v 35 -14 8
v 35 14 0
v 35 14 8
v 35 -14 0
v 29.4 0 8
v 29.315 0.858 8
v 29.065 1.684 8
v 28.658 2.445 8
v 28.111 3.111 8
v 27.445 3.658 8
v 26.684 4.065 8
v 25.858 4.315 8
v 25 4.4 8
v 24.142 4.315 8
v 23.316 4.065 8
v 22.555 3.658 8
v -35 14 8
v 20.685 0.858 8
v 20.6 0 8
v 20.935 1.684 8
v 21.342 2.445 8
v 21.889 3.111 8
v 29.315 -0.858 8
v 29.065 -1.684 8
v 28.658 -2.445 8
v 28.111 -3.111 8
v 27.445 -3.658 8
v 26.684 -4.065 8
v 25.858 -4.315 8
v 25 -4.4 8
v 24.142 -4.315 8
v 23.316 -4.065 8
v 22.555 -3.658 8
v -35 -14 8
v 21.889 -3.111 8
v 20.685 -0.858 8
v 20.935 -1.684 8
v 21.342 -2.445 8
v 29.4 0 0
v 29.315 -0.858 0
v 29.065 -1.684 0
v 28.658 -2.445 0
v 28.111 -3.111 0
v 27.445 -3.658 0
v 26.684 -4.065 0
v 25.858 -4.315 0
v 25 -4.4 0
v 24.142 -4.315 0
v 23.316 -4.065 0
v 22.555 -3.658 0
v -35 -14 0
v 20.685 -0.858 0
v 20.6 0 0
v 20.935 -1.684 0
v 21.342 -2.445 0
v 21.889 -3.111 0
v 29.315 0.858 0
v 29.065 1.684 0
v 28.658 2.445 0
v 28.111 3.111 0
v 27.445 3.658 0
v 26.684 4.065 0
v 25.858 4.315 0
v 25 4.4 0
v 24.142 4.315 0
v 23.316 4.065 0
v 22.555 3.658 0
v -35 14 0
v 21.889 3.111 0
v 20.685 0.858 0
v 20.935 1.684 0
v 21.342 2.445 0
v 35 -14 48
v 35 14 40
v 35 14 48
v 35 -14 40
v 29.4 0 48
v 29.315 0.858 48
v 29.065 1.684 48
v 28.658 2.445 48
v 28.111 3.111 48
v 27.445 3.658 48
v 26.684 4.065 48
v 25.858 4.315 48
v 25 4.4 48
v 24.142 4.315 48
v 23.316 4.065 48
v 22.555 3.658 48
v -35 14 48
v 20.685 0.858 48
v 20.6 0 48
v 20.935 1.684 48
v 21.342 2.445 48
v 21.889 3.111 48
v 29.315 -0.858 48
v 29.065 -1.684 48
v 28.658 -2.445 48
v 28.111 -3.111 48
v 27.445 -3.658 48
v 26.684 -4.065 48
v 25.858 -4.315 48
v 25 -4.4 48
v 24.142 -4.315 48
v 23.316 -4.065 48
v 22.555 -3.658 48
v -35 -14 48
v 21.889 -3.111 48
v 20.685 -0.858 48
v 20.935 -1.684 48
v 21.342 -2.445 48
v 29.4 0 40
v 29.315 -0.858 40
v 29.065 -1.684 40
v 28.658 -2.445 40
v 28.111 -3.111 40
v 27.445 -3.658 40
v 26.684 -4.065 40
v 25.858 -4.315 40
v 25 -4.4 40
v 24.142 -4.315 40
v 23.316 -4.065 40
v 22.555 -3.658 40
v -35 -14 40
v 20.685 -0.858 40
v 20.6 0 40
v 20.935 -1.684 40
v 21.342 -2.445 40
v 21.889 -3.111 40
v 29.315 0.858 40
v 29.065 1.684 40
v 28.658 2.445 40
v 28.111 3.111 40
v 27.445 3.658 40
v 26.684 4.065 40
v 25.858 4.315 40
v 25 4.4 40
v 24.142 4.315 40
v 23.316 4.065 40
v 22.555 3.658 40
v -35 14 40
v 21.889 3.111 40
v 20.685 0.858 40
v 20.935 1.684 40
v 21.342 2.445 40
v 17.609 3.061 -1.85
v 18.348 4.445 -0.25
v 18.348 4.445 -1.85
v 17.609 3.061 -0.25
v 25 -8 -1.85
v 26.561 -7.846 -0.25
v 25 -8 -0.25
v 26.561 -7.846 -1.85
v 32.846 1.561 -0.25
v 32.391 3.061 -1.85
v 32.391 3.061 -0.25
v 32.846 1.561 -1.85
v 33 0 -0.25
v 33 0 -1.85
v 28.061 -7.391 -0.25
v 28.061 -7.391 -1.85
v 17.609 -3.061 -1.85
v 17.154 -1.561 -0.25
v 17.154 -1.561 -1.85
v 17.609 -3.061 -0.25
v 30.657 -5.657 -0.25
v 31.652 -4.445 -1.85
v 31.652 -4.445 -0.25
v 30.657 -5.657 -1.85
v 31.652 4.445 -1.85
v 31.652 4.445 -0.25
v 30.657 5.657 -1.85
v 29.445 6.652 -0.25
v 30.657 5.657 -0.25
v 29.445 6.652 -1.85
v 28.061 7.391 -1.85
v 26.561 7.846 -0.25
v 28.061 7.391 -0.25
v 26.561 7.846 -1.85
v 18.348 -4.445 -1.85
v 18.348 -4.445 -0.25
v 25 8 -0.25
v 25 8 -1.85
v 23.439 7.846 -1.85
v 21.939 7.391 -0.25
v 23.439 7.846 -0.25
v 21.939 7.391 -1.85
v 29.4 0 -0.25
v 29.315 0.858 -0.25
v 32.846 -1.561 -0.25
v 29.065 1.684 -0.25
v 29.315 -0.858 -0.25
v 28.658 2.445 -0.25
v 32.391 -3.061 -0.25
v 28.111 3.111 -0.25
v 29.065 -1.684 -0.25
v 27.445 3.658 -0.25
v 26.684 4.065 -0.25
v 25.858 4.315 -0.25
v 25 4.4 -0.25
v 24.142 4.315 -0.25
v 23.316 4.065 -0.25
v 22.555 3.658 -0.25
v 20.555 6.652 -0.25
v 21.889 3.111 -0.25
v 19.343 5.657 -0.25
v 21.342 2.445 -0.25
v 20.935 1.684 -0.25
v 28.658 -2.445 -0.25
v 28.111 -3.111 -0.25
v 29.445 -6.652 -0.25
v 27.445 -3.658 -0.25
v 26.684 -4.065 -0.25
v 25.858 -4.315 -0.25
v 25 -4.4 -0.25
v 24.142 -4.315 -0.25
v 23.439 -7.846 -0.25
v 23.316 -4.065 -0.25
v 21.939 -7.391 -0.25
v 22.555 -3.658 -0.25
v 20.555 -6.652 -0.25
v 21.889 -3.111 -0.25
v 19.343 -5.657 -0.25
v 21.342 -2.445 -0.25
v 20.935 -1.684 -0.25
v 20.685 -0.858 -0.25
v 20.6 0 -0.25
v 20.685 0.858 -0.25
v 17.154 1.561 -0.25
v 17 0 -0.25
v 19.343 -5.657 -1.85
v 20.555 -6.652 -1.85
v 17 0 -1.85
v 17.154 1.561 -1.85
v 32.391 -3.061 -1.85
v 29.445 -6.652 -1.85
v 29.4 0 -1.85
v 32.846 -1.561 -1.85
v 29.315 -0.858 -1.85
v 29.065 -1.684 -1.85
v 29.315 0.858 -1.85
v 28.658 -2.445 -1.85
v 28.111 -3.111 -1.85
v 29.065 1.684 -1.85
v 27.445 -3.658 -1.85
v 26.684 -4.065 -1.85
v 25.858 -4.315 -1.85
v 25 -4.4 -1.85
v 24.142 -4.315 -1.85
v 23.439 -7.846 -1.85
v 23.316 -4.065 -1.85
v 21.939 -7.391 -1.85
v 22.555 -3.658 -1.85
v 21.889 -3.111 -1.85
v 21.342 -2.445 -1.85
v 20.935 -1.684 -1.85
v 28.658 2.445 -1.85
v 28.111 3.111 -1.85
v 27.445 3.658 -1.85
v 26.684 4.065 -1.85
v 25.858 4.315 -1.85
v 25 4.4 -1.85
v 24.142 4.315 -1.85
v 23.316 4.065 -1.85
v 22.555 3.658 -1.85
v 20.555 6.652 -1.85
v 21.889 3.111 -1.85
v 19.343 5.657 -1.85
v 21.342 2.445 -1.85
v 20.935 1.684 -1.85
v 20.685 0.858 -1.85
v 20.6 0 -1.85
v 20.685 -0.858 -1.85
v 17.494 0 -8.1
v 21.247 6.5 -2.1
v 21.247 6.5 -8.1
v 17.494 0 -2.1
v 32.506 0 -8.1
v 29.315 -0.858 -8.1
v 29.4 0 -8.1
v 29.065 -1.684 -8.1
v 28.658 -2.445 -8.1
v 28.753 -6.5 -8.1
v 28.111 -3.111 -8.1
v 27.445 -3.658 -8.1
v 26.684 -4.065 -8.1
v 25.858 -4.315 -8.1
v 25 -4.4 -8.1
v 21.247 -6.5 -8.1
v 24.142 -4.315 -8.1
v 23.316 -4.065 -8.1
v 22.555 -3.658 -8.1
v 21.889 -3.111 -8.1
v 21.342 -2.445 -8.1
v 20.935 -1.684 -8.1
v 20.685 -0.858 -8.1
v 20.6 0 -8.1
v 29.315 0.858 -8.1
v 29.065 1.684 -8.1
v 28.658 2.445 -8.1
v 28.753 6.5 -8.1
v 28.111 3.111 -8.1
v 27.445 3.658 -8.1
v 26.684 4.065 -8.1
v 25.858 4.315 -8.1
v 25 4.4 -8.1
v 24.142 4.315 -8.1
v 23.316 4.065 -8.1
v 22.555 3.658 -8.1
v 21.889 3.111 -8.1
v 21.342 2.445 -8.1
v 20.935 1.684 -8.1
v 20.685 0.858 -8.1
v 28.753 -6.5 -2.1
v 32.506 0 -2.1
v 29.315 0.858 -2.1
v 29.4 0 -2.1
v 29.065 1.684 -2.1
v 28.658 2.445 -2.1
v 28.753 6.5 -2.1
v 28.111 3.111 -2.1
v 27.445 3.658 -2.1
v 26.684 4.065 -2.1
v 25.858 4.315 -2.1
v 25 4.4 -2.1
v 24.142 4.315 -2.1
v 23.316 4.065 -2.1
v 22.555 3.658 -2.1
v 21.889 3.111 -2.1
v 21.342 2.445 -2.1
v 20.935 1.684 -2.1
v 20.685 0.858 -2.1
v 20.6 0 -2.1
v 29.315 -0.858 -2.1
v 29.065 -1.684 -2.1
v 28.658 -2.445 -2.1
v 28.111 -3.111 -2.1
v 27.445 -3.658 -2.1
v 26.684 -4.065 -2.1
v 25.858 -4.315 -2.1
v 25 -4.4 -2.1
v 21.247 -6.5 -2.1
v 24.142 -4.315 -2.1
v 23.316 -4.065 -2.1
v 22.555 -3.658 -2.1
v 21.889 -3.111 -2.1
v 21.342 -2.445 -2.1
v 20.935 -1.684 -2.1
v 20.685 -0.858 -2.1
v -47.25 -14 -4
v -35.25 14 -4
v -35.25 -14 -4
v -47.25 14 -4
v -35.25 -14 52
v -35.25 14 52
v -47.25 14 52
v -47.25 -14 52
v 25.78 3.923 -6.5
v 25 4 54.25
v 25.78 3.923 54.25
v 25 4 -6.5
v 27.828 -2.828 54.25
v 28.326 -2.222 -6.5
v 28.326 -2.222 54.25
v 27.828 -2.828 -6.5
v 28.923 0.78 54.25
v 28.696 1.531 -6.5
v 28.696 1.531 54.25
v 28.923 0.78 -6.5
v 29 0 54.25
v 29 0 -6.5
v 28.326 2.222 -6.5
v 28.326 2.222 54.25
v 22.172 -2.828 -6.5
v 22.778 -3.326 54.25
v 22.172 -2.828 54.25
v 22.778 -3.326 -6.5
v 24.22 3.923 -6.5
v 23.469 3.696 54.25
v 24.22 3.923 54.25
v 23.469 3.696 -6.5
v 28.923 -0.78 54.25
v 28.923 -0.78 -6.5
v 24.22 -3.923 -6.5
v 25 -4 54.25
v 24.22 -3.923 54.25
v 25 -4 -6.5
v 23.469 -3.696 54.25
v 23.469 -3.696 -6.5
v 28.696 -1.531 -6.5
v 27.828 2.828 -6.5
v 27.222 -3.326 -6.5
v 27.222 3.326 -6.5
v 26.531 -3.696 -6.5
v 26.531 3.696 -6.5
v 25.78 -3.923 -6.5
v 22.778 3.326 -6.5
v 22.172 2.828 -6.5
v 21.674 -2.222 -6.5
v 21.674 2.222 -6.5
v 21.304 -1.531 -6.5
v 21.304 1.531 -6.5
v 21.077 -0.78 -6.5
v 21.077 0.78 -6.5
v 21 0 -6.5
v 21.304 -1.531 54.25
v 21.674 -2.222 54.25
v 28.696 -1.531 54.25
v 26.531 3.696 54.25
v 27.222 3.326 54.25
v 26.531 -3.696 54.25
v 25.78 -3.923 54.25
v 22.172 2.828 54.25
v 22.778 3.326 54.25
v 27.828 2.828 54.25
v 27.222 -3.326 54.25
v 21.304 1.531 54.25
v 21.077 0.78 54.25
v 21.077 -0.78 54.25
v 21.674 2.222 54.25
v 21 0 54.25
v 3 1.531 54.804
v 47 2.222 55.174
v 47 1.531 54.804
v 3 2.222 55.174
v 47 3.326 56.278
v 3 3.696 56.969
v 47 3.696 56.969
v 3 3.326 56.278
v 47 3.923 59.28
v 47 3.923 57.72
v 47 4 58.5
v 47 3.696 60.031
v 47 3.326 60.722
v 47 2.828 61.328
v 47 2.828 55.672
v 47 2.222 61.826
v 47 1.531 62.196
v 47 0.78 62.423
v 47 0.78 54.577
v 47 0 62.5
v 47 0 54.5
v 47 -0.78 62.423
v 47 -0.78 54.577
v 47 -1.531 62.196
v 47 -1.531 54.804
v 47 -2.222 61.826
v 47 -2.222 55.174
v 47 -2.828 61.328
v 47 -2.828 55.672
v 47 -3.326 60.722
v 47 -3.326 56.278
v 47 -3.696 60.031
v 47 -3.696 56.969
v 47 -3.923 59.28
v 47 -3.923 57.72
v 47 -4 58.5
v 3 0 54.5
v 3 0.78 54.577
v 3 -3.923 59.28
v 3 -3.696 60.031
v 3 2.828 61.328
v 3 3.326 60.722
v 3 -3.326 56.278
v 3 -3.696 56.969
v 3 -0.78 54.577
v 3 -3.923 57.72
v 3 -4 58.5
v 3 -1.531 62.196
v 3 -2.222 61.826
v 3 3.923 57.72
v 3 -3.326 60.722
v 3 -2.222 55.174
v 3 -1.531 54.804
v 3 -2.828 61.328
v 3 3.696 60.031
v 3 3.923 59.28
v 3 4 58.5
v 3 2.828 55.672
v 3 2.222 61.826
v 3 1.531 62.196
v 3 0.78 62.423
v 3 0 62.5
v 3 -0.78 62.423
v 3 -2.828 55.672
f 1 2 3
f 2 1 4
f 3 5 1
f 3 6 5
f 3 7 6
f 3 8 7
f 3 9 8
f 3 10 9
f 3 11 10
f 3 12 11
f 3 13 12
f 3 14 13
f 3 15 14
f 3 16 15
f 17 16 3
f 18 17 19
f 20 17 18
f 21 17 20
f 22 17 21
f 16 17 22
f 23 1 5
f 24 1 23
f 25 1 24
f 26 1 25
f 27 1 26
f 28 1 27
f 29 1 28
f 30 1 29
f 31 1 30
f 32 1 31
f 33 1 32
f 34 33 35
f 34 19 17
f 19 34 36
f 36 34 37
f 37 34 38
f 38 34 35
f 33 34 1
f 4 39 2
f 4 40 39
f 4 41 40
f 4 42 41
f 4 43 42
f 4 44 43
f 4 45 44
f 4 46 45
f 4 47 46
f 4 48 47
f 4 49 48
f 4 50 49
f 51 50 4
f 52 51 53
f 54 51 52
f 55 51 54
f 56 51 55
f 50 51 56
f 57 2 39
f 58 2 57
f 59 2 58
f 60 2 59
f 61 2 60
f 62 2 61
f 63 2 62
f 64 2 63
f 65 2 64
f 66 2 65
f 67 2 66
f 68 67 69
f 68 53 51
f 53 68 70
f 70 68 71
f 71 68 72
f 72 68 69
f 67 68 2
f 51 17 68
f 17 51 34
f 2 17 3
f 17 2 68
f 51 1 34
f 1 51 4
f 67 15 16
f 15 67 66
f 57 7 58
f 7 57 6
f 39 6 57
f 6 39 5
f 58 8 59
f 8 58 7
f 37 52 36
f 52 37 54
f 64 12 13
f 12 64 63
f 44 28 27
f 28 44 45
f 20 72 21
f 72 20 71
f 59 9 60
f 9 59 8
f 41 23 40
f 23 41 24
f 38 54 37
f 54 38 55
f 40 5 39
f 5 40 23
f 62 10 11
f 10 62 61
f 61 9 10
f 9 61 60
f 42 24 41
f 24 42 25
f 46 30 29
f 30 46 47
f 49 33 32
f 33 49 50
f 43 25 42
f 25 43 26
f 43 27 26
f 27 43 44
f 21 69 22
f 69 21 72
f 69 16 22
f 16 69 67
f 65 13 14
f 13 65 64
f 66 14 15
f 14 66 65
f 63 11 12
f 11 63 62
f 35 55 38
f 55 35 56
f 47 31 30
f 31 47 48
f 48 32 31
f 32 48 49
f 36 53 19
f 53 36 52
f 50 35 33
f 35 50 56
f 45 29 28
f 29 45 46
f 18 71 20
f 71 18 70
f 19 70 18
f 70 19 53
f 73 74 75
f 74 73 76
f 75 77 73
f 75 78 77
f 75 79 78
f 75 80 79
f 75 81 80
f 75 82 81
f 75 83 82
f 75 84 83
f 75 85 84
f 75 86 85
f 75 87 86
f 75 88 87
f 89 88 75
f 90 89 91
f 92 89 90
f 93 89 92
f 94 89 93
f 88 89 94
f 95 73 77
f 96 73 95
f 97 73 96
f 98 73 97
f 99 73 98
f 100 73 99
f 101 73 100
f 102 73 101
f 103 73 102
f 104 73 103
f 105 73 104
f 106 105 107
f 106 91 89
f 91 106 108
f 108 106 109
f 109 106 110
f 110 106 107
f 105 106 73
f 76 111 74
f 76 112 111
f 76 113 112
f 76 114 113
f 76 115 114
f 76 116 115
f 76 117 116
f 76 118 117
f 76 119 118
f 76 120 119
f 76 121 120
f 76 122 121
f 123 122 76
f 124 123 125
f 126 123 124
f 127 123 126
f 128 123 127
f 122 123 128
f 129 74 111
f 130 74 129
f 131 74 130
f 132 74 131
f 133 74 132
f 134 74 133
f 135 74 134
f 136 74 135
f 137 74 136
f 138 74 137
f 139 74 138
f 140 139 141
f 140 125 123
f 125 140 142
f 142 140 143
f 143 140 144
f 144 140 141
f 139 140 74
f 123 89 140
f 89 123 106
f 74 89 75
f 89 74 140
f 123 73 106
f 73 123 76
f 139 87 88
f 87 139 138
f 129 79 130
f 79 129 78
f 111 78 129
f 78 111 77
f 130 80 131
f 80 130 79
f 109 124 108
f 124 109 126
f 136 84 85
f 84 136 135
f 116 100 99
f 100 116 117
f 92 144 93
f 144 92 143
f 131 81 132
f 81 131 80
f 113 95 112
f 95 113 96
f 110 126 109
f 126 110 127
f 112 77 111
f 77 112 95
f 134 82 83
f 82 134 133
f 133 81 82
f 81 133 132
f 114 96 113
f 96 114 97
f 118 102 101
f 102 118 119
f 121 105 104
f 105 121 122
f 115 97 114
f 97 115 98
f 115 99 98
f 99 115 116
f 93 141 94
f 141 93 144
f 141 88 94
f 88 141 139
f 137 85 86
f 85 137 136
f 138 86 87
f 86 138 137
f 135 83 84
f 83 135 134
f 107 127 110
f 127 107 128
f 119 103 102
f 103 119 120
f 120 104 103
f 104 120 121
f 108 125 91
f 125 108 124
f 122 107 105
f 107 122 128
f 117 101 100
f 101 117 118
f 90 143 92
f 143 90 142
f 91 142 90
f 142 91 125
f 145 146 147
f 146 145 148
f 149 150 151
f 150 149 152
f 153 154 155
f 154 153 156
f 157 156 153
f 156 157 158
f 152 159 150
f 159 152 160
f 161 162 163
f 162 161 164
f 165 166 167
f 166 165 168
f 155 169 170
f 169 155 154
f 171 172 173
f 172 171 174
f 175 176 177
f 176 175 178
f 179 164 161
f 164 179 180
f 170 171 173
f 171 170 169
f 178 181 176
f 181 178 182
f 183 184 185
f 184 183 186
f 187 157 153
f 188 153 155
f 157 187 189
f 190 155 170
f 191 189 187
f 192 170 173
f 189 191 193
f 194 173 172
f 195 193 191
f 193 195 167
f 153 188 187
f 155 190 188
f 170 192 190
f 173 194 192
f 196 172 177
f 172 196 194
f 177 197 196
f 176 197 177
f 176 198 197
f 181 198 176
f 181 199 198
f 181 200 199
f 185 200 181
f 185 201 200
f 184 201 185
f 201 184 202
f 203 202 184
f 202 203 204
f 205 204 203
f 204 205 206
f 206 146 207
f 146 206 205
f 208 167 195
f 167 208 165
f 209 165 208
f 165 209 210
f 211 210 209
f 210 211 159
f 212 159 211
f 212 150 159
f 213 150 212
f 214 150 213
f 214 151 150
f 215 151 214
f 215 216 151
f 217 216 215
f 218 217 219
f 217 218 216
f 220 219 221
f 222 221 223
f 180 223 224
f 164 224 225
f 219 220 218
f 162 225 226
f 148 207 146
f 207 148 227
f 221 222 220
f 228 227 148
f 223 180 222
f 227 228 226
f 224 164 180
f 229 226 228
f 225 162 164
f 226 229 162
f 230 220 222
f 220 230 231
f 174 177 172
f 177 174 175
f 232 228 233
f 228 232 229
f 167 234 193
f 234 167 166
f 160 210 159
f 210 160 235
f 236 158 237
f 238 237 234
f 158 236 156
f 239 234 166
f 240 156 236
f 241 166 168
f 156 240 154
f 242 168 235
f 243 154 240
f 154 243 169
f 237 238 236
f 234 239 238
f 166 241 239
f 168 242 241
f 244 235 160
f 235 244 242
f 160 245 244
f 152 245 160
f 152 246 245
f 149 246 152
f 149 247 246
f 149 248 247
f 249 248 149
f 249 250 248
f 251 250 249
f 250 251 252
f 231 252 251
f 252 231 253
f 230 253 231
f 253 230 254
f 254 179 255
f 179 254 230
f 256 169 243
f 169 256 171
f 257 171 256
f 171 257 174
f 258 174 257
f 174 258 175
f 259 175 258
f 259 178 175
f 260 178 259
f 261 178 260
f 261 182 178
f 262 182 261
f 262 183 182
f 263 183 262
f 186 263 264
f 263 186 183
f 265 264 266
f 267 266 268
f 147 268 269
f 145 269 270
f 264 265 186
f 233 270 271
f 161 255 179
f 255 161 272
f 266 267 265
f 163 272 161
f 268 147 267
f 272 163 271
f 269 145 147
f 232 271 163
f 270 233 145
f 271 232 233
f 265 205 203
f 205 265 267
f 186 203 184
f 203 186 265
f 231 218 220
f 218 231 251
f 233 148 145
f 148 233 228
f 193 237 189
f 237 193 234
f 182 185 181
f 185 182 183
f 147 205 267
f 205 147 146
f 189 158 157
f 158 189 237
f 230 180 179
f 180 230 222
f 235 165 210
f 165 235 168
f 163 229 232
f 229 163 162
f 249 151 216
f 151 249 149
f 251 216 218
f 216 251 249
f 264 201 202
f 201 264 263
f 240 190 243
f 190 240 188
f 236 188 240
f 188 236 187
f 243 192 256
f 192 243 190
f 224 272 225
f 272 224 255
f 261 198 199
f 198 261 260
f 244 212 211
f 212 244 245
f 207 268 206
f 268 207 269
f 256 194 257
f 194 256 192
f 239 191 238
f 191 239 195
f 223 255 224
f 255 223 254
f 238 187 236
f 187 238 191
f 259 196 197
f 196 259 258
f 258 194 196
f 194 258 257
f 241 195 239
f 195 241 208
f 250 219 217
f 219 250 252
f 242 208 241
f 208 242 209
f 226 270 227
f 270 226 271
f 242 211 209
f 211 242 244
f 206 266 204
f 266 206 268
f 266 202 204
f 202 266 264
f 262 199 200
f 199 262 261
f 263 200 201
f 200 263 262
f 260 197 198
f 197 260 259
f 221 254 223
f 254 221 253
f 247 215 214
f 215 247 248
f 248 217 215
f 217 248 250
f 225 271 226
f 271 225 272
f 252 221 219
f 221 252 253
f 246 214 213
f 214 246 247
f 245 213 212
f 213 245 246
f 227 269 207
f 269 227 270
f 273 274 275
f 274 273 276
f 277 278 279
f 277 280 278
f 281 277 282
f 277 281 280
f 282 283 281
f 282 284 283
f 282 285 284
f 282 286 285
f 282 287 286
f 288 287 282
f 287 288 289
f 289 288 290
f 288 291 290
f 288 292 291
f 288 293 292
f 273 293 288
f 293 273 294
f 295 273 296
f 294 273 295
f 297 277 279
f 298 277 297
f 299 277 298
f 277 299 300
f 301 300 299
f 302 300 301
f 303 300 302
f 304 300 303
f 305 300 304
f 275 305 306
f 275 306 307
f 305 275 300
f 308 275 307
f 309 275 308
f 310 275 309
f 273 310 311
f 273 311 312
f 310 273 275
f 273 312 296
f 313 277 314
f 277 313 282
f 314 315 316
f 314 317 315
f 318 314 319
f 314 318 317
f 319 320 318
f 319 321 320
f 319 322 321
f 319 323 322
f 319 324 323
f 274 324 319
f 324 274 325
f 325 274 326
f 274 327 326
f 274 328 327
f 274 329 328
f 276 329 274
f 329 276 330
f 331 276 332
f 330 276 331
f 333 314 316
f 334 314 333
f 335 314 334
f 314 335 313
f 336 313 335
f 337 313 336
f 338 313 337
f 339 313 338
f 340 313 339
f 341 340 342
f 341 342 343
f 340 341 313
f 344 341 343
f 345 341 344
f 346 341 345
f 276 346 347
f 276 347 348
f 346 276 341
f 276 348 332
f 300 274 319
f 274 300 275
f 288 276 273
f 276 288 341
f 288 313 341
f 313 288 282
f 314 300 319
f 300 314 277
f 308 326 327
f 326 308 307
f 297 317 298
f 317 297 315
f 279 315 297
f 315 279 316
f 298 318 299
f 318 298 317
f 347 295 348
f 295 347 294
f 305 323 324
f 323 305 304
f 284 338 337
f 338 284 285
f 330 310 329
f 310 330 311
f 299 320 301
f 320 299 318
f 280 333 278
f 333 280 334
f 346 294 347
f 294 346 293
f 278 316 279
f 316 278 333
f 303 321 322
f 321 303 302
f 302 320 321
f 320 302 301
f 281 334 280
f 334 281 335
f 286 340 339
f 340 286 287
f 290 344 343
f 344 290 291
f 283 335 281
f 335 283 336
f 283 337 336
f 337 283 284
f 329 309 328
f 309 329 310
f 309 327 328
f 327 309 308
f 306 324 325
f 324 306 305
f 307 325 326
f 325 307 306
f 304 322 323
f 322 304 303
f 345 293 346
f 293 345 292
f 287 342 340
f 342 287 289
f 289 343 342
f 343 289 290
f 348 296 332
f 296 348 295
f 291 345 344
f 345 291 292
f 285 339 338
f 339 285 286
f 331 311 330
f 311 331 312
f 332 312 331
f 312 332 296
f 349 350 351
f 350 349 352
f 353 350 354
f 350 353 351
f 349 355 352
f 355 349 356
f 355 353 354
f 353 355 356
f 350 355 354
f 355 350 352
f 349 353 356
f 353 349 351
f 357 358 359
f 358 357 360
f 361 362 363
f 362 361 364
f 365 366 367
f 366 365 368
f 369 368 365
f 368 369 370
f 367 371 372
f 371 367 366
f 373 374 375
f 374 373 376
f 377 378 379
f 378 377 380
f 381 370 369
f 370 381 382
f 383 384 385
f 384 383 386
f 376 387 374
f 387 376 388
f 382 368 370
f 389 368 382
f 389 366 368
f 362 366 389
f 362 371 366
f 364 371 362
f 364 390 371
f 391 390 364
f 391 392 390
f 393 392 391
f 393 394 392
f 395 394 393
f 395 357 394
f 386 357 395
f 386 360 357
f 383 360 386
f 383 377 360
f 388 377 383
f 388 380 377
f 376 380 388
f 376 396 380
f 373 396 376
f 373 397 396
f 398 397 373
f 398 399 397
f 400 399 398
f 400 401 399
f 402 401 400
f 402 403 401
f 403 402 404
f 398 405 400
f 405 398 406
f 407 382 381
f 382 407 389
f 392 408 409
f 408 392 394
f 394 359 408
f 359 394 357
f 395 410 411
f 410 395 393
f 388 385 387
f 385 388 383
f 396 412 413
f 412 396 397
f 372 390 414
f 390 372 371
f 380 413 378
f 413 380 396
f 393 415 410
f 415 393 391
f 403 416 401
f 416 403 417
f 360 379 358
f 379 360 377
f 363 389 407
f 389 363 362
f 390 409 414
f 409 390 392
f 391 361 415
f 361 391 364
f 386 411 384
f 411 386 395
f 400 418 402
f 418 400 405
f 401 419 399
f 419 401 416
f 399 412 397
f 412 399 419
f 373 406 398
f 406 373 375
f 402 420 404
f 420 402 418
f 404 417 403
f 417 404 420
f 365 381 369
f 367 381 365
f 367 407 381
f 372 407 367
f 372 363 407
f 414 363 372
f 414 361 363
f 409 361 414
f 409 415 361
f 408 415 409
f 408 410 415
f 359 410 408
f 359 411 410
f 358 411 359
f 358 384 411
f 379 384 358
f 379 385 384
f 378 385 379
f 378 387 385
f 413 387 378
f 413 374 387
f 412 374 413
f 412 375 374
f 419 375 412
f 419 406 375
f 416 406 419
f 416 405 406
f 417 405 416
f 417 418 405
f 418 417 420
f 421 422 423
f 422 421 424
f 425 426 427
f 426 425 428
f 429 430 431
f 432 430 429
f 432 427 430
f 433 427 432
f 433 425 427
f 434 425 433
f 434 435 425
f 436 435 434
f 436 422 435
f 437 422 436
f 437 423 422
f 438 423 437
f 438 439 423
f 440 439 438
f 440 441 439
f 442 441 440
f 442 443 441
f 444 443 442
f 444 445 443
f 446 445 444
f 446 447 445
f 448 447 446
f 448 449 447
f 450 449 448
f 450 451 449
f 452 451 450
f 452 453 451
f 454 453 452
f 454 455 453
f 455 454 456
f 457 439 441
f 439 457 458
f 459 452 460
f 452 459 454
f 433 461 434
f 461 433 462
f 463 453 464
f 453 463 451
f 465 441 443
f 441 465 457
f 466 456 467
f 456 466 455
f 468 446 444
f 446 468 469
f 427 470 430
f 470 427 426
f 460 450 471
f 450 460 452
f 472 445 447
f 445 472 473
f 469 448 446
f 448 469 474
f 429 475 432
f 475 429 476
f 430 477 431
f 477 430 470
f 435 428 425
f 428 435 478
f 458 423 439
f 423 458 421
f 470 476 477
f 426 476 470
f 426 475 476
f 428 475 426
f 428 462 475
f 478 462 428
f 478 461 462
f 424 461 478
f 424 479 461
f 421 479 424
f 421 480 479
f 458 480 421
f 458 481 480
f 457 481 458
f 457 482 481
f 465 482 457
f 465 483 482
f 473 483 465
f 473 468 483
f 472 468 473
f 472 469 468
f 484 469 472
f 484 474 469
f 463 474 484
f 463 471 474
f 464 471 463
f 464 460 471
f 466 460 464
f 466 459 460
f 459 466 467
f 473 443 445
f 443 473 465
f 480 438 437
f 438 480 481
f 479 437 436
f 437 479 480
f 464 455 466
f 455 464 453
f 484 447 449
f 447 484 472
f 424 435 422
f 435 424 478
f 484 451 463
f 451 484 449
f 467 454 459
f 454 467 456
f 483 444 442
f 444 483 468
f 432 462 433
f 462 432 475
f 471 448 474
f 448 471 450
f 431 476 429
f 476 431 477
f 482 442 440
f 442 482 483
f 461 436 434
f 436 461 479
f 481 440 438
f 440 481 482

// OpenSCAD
$fn = 32;

// ------------------------------------------------------------------------
// C clamp: throat 40 mm, screw d8
// Every part is its own module, assembly() places every instance.
// ------------------------------------------------------------------------

// --- part 1 ---
module clamp_arm() {
  difference() {
    translate([-35, -14, 0]) cube([70, 28, 8]);
    translate([25, 0, -1]) cylinder(h = 10, d = 8.8);
  }
}

// --- part 2 ---
module clamp_spine() {
  difference() {
    translate([-28, -14, 0]) cube([56, 28, 12]);
  }
}

// --- part 3 ---
module clamp_screw() {
  translate([0, 0, -30.375]) cylinder(h = 60.75, d = 8);
}

// --- part 4 ---
module clamp_washer() {
  difference() {
      translate([0, 0, 0]) cylinder(h = 1.6, d = 16);
      translate([0, 0, -1]) cylinder(h = 3.6, d = 8.8);
    }
}

// --- part 5 ---
module clamp_nut() {
  difference() {
    linear_extrude(height = 6) polygon(points = [[7.506, 0], [3.753, 6.5], [-3.753, 6.5], [-7.506, 0], [-3.753, -6.5], [3.753, -6.5]]);
    translate([0, 0, -1]) cylinder(h = 8, d = 8.8);
  }
}

// --- part 6 ---
module tommy_bar() {
  translate([0, 0, -22]) cylinder(h = 44, d = 8);
}

// --- assembly ---
module assembly() {
  color([0.80, 0.24, 0.20]) translate([0, 0, 0]) rotate([0, 0, 0]) clamp_arm();
  color([0.20, 0.45, 0.75]) translate([0, 0, 40]) rotate([0, 0, 0]) clamp_arm();
  color([0.25, 0.62, 0.32]) translate([-47.25, 0, 24]) rotate([0, 90, 0]) clamp_spine();
  color([0.92, 0.70, 0.18]) translate([25, 0, 23.875]) rotate([0, 0, 0]) clamp_screw();
  color([0.58, 0.35, 0.70]) translate([25, 0, -1.85]) rotate([0, 0, 0]) clamp_washer();
  color([0.16, 0.66, 0.66]) translate([25, 0, -8.1]) rotate([0, 0, 0]) clamp_nut();
  color([0.85, 0.48, 0.18]) translate([25, 0, 58.5]) rotate([0, 90, 0]) tommy_bar();
}

assembly();
